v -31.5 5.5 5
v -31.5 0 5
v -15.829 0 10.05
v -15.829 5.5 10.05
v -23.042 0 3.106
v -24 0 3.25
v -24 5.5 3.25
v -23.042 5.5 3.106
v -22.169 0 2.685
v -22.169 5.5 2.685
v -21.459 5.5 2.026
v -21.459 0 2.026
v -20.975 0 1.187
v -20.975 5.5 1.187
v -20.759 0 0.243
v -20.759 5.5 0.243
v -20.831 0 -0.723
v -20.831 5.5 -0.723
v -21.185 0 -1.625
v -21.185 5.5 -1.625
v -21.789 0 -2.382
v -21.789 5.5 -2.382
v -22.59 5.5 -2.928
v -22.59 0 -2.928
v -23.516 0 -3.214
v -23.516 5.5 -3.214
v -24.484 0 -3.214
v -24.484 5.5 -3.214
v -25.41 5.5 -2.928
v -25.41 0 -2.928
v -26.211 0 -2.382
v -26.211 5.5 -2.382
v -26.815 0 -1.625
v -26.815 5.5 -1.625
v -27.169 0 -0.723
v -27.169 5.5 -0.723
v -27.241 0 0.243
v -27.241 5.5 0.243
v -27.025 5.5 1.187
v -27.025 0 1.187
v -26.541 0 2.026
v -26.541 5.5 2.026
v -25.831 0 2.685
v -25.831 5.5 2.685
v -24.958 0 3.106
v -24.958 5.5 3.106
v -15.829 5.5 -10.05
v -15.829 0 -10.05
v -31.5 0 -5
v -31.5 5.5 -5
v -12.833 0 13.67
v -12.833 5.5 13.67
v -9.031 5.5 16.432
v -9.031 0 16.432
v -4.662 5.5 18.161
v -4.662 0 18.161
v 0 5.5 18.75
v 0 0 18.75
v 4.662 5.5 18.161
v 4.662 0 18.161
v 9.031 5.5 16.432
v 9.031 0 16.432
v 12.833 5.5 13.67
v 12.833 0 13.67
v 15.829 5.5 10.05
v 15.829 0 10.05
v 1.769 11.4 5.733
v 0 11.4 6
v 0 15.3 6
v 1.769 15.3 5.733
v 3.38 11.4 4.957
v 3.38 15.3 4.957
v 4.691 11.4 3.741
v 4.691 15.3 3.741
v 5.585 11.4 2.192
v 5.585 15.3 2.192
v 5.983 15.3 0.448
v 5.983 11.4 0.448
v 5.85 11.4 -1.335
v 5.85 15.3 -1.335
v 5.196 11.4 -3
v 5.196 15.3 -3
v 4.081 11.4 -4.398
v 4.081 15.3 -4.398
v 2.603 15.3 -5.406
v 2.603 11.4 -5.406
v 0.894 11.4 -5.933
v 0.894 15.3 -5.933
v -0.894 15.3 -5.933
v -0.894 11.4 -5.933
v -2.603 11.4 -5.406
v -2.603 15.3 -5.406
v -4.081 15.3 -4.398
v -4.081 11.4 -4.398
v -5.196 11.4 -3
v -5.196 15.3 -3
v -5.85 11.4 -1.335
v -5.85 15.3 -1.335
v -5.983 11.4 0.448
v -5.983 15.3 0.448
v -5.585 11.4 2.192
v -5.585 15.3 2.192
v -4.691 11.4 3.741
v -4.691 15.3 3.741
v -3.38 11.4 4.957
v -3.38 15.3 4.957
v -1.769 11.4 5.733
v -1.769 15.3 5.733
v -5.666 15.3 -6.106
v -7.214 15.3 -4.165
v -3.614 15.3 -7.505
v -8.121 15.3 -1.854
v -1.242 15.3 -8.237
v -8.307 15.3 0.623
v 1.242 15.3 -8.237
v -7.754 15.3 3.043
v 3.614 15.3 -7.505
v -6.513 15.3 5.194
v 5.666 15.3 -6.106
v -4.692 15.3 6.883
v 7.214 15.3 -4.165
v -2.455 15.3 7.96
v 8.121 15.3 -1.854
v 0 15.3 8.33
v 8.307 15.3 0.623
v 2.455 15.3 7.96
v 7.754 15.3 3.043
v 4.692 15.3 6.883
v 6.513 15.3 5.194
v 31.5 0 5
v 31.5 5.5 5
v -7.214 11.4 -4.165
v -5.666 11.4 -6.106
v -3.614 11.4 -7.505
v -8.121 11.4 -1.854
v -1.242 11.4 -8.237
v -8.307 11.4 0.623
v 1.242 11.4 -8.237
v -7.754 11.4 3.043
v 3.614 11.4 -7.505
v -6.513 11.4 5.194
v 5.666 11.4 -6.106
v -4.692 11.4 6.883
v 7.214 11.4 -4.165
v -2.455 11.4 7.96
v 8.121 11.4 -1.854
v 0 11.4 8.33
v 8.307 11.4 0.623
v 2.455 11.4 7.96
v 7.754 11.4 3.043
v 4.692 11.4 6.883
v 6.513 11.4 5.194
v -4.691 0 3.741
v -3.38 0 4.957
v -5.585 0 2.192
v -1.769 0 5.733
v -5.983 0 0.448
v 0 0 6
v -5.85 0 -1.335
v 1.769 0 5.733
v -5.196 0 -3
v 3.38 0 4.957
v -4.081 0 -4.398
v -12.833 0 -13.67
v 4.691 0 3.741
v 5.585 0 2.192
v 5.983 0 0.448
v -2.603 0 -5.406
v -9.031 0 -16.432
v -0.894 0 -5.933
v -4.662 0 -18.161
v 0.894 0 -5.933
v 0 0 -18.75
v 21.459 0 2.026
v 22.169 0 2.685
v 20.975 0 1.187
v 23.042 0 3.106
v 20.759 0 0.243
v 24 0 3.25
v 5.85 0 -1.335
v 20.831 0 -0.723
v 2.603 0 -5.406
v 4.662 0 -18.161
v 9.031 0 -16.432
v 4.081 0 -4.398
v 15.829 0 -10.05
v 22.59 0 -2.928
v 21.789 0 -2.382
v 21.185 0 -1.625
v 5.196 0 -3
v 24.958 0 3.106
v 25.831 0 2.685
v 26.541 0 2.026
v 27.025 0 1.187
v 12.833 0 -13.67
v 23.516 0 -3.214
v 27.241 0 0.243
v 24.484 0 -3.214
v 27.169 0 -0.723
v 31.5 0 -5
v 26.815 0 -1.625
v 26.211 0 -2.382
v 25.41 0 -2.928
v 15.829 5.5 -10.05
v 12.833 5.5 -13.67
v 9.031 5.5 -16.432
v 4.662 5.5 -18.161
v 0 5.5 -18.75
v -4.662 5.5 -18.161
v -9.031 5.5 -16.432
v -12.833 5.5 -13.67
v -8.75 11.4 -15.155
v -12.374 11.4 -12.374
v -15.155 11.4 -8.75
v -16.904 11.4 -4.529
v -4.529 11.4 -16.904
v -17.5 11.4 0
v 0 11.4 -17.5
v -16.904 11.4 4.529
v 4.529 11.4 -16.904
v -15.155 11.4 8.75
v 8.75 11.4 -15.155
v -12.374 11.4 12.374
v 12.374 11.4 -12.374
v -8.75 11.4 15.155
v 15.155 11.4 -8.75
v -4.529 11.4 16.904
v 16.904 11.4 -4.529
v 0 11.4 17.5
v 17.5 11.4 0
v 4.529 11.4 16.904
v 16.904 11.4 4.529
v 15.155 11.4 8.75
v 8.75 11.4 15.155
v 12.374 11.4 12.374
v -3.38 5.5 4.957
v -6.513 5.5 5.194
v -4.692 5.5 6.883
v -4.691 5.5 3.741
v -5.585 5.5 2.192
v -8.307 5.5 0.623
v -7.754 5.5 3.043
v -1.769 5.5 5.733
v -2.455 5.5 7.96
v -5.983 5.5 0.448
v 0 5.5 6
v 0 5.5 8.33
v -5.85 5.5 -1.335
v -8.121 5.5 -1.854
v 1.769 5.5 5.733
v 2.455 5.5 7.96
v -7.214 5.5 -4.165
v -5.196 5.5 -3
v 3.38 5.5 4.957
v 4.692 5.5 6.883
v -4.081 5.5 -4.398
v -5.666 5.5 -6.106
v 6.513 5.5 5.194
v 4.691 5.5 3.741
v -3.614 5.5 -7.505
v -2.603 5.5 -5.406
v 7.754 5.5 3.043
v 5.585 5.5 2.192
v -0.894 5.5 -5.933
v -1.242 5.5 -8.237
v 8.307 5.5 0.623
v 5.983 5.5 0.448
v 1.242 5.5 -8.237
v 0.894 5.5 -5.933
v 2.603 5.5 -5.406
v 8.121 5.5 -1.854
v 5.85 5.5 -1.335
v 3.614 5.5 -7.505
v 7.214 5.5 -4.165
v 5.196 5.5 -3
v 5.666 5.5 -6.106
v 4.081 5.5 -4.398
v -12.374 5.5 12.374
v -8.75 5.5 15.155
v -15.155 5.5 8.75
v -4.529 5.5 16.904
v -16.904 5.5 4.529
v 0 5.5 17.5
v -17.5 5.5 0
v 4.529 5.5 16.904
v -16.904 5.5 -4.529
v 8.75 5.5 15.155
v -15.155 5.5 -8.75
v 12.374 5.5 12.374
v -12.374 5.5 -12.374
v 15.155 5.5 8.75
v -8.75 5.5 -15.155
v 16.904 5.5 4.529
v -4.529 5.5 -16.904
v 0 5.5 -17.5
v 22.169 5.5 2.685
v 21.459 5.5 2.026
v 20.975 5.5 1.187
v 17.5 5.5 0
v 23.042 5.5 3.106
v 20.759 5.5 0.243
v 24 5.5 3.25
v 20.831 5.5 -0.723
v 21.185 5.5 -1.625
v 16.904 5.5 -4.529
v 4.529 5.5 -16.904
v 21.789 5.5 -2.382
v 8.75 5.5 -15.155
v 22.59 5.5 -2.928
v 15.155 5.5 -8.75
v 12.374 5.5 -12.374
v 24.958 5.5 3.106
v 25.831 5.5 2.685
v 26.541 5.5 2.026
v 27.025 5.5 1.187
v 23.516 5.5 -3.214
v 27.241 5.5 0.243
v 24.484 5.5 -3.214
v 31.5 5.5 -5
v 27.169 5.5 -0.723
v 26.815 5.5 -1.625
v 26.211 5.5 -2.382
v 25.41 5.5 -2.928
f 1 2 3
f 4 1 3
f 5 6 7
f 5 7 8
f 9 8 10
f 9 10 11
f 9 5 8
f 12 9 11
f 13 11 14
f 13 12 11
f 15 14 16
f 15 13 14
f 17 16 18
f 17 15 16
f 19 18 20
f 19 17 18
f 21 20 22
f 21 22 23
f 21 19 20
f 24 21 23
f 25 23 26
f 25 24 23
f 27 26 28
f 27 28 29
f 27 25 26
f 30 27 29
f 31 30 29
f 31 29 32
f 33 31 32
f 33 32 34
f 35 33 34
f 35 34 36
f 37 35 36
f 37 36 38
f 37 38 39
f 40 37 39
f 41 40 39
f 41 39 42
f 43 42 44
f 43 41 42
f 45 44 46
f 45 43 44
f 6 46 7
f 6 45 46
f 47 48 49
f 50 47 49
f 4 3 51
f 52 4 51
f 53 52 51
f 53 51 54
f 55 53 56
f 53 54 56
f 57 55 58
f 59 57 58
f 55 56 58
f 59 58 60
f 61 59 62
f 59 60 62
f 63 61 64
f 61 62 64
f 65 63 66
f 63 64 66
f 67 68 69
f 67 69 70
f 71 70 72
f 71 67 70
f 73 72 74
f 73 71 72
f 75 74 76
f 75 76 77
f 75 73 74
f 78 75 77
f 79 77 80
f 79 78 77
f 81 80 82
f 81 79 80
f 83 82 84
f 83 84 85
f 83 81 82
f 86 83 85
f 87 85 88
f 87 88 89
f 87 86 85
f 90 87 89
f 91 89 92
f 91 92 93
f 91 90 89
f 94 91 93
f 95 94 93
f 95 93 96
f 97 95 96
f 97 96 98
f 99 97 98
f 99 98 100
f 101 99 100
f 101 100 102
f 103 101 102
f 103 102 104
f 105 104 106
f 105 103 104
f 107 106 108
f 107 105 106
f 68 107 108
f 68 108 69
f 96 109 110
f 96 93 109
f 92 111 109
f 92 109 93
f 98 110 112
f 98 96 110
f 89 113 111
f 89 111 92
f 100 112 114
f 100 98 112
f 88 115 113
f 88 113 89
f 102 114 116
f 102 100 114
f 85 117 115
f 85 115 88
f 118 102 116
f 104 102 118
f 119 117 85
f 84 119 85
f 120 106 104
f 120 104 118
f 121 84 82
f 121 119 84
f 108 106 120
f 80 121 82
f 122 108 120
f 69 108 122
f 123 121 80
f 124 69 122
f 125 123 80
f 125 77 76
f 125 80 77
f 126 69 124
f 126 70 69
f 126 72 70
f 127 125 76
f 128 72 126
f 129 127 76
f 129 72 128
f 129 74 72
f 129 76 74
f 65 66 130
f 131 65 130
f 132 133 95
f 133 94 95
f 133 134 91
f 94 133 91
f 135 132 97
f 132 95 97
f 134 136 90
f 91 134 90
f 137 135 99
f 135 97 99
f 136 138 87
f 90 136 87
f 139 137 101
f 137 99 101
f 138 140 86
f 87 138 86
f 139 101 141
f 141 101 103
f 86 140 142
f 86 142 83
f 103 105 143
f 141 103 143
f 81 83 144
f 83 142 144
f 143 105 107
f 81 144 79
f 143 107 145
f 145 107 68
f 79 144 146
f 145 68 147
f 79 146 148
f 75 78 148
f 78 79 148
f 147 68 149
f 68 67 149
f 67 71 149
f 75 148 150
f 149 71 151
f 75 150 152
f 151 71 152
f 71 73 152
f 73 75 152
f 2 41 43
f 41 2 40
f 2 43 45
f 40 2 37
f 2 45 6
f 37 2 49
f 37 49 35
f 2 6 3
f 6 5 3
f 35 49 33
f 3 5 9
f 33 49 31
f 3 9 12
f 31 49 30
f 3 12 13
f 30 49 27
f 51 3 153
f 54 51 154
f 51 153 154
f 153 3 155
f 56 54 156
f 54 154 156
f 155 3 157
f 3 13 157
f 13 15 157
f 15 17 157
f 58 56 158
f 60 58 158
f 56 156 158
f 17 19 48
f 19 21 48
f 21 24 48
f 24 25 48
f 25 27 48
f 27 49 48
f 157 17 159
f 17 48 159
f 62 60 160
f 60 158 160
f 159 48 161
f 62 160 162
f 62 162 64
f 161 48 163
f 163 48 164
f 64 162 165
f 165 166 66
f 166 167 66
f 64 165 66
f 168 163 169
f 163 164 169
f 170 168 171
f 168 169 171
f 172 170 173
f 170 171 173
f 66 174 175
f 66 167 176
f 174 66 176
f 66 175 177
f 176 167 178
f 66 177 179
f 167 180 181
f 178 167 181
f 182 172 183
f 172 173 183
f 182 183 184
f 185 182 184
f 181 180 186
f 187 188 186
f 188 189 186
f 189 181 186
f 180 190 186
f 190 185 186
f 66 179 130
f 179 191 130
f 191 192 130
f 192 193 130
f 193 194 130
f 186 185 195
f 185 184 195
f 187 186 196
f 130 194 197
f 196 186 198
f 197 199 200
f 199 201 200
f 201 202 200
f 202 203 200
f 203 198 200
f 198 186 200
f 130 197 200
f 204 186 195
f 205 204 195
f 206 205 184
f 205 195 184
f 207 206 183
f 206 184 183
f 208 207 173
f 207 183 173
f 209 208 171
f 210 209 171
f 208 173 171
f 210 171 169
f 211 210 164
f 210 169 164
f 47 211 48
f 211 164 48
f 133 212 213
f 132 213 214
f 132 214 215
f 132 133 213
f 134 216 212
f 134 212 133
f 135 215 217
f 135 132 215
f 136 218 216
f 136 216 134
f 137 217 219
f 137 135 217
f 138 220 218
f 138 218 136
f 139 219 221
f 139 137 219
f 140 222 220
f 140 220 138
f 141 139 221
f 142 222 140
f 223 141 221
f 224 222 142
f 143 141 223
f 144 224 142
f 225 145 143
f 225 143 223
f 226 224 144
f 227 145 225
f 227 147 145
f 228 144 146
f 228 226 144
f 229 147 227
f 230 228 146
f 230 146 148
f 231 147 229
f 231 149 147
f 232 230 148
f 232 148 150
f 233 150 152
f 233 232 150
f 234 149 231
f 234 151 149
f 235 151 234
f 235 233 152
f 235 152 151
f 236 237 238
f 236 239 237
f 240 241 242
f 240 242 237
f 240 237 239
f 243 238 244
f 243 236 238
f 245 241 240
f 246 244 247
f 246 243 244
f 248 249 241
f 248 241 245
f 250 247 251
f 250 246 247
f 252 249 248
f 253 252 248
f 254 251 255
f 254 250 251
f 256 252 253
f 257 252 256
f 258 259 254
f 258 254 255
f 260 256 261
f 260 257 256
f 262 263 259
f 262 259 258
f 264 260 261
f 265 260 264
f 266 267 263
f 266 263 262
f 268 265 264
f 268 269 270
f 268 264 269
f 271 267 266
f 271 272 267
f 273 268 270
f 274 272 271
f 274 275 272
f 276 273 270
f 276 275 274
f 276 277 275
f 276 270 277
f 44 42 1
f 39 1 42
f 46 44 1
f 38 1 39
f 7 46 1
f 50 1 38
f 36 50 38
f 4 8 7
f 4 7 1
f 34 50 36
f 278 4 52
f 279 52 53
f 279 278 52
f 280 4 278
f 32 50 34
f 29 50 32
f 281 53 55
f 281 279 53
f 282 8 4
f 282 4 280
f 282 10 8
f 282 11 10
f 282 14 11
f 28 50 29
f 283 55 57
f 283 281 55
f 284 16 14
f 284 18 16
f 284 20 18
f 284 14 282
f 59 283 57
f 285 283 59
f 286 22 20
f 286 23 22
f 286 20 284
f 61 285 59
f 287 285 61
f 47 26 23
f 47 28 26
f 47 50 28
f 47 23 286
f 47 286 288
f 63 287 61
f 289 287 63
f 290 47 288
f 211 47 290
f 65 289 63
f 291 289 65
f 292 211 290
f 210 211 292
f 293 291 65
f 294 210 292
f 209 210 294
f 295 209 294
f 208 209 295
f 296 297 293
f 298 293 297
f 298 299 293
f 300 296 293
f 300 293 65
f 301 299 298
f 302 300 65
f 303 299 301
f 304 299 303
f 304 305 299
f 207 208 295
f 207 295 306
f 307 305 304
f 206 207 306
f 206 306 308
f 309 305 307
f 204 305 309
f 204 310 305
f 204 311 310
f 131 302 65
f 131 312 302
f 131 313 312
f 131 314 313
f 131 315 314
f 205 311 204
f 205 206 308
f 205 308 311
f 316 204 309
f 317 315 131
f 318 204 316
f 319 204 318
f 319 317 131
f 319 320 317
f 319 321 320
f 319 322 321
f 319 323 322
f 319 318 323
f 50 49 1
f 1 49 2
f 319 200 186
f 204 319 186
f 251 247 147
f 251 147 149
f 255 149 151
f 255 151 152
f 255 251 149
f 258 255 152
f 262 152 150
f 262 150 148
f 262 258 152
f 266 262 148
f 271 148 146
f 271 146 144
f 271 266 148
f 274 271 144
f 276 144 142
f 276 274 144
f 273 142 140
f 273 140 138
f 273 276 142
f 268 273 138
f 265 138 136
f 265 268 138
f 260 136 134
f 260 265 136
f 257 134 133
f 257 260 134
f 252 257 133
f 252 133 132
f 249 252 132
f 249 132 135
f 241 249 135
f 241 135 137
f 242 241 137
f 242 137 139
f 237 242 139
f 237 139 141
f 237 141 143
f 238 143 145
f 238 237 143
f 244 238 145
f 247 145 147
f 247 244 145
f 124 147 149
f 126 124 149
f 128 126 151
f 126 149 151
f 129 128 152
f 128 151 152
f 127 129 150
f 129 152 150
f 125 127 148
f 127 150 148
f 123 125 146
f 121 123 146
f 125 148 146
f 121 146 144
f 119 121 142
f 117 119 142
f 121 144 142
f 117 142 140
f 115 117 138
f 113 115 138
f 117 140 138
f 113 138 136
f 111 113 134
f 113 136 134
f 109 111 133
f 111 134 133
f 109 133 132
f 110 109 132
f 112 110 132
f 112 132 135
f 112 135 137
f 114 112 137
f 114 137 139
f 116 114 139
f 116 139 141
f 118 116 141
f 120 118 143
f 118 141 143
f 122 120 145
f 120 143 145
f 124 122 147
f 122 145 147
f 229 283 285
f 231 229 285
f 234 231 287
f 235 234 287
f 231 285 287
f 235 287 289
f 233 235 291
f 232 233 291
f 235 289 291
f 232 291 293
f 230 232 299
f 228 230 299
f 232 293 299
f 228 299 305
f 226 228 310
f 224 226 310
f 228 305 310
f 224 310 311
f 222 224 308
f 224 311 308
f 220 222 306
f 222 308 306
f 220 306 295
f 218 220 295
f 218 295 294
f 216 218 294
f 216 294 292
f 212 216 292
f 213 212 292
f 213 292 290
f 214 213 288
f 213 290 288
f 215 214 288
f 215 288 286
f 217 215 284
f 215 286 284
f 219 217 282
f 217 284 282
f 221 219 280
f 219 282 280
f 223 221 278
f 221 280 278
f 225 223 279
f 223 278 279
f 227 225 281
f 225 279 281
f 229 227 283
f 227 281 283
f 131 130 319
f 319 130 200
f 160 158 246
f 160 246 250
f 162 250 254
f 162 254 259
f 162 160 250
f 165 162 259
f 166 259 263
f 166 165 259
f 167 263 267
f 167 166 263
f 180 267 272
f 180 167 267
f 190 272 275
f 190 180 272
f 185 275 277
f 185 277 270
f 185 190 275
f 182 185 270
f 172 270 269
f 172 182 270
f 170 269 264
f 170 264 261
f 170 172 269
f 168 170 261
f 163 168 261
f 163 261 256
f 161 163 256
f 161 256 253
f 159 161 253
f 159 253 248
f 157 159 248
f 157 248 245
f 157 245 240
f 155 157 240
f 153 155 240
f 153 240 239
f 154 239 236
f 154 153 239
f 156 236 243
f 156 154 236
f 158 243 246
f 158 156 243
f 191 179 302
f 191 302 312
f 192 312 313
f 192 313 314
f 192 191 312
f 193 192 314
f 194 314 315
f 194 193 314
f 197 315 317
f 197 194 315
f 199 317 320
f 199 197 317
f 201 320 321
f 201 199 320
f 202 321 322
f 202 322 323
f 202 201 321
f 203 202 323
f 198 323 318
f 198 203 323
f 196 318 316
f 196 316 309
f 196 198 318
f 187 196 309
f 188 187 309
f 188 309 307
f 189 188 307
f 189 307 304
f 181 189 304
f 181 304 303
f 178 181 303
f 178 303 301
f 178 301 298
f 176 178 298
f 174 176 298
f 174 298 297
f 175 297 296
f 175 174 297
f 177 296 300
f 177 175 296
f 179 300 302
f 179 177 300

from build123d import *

# Parameters (mm, degrees)
SKETCH1_R           = 18.75
SKETCH1_R_2         = 6
SKETCH1_R_3         = 3.25
BOSS_EXTRUDE1_DEPTH = 5.5
SKETCH2_R           = 17.5
SKETCH2_R_2         = 8.33
BOSS_EXTRUDE2_DEPTH = 5.9
SKETCH3_R           = 8.33
SKETCH3_R_2         = 6
BOSS_EXTRUDE3_DEPTH = 3.9


with BuildPart() as part:
    # Sketch1 → Boss-Extrude1 (new body)
    # profile 1 of 3: a face of its own
    with BuildSketch(Plane(origin=(0, 0, 0), x_dir=(1, 0, 0), z_dir=(0, 1, 0))):
        Circle(SKETCH1_R)
        with Locations(Location((0, 0, 0), (0, 0, 270))):
            Circle(SKETCH1_R_2, mode=Mode.SUBTRACT)
    # profile 2 of 3: a face of its own
    with BuildSketch(Plane(origin=(0, 0, 0), x_dir=(1, 0, 0), z_dir=(0, 1, 0))):
        with BuildLine():
            ThreePointArc((-15.82908715, -10.05), (-18.75, 0), (-15.82908715, 10.05))
            Line((-15.82908715, 10.05), (-31.5, 5))
            Line((-31.5, 5), (-31.5, 0))
            Line((-31.5, 0), (-31.5, -5))
            Line((-31.5, -5), (-15.82908715, -10.05))
        make_face()
        with Locations(Location((-24, 0, 0), (0, 0, 270))):
            Circle(SKETCH1_R_3, mode=Mode.SUBTRACT)
    # profile 3 of 3: a face of its own
    with BuildSketch(Plane(origin=(0, 0, 0), x_dir=(1, 0, 0), z_dir=(0, 1, 0))):
        with BuildLine():
            Line((31.5, -5), (31.5, 0))
            Line((31.5, 0), (31.5, 5))
            Line((31.5, 5), (15.82908715, 10.05))
            ThreePointArc((15.82908715, 10.05), (18.004969926, 5.232930151), (18.75, 0))
            ThreePointArc((18.75, 0), (18.004969926, -5.232930151), (15.82908715, -10.05))
            Line((15.82908715, -10.05), (31.5, -5))
        make_face()
        with Locations(Location((24, 0, 0), (0, 0, 270))):
            Circle(SKETCH1_R_3, mode=Mode.SUBTRACT)
    extrude(amount=BOSS_EXTRUDE1_DEPTH)

    # Sketch2 → Boss-Extrude2 (add)
    with BuildSketch(Plane(origin=(0, 5.5, 0), x_dir=(1, 0, 0), z_dir=(0, 1, 0))):
        with Locations(Location((0, 0, 0), (0, 0, 270))):
            Circle(SKETCH2_R)
        with Locations(Location((0, 0, 0), (0, 0, 270))):
            Circle(SKETCH2_R_2, mode=Mode.SUBTRACT)
    extrude(amount=BOSS_EXTRUDE2_DEPTH)


with BuildPart() as body_2:
    # Sketch3 → Boss-Extrude3 (new body)
    with BuildSketch(Plane(origin=(0, 11.4, 0), x_dir=(1, 0, 0), z_dir=(0, 1, 0))):
        with Locations(Location((0, 0, 0), (0, 0, 270))):
            Circle(SKETCH3_R)
        with Locations(Location((0, 0, 0), (0, 0, 270))):
            Circle(SKETCH3_R_2, mode=Mode.SUBTRACT)
    extrude(amount=BOSS_EXTRUDE3_DEPTH)


solid = Compound([part.part, body_2.part])
